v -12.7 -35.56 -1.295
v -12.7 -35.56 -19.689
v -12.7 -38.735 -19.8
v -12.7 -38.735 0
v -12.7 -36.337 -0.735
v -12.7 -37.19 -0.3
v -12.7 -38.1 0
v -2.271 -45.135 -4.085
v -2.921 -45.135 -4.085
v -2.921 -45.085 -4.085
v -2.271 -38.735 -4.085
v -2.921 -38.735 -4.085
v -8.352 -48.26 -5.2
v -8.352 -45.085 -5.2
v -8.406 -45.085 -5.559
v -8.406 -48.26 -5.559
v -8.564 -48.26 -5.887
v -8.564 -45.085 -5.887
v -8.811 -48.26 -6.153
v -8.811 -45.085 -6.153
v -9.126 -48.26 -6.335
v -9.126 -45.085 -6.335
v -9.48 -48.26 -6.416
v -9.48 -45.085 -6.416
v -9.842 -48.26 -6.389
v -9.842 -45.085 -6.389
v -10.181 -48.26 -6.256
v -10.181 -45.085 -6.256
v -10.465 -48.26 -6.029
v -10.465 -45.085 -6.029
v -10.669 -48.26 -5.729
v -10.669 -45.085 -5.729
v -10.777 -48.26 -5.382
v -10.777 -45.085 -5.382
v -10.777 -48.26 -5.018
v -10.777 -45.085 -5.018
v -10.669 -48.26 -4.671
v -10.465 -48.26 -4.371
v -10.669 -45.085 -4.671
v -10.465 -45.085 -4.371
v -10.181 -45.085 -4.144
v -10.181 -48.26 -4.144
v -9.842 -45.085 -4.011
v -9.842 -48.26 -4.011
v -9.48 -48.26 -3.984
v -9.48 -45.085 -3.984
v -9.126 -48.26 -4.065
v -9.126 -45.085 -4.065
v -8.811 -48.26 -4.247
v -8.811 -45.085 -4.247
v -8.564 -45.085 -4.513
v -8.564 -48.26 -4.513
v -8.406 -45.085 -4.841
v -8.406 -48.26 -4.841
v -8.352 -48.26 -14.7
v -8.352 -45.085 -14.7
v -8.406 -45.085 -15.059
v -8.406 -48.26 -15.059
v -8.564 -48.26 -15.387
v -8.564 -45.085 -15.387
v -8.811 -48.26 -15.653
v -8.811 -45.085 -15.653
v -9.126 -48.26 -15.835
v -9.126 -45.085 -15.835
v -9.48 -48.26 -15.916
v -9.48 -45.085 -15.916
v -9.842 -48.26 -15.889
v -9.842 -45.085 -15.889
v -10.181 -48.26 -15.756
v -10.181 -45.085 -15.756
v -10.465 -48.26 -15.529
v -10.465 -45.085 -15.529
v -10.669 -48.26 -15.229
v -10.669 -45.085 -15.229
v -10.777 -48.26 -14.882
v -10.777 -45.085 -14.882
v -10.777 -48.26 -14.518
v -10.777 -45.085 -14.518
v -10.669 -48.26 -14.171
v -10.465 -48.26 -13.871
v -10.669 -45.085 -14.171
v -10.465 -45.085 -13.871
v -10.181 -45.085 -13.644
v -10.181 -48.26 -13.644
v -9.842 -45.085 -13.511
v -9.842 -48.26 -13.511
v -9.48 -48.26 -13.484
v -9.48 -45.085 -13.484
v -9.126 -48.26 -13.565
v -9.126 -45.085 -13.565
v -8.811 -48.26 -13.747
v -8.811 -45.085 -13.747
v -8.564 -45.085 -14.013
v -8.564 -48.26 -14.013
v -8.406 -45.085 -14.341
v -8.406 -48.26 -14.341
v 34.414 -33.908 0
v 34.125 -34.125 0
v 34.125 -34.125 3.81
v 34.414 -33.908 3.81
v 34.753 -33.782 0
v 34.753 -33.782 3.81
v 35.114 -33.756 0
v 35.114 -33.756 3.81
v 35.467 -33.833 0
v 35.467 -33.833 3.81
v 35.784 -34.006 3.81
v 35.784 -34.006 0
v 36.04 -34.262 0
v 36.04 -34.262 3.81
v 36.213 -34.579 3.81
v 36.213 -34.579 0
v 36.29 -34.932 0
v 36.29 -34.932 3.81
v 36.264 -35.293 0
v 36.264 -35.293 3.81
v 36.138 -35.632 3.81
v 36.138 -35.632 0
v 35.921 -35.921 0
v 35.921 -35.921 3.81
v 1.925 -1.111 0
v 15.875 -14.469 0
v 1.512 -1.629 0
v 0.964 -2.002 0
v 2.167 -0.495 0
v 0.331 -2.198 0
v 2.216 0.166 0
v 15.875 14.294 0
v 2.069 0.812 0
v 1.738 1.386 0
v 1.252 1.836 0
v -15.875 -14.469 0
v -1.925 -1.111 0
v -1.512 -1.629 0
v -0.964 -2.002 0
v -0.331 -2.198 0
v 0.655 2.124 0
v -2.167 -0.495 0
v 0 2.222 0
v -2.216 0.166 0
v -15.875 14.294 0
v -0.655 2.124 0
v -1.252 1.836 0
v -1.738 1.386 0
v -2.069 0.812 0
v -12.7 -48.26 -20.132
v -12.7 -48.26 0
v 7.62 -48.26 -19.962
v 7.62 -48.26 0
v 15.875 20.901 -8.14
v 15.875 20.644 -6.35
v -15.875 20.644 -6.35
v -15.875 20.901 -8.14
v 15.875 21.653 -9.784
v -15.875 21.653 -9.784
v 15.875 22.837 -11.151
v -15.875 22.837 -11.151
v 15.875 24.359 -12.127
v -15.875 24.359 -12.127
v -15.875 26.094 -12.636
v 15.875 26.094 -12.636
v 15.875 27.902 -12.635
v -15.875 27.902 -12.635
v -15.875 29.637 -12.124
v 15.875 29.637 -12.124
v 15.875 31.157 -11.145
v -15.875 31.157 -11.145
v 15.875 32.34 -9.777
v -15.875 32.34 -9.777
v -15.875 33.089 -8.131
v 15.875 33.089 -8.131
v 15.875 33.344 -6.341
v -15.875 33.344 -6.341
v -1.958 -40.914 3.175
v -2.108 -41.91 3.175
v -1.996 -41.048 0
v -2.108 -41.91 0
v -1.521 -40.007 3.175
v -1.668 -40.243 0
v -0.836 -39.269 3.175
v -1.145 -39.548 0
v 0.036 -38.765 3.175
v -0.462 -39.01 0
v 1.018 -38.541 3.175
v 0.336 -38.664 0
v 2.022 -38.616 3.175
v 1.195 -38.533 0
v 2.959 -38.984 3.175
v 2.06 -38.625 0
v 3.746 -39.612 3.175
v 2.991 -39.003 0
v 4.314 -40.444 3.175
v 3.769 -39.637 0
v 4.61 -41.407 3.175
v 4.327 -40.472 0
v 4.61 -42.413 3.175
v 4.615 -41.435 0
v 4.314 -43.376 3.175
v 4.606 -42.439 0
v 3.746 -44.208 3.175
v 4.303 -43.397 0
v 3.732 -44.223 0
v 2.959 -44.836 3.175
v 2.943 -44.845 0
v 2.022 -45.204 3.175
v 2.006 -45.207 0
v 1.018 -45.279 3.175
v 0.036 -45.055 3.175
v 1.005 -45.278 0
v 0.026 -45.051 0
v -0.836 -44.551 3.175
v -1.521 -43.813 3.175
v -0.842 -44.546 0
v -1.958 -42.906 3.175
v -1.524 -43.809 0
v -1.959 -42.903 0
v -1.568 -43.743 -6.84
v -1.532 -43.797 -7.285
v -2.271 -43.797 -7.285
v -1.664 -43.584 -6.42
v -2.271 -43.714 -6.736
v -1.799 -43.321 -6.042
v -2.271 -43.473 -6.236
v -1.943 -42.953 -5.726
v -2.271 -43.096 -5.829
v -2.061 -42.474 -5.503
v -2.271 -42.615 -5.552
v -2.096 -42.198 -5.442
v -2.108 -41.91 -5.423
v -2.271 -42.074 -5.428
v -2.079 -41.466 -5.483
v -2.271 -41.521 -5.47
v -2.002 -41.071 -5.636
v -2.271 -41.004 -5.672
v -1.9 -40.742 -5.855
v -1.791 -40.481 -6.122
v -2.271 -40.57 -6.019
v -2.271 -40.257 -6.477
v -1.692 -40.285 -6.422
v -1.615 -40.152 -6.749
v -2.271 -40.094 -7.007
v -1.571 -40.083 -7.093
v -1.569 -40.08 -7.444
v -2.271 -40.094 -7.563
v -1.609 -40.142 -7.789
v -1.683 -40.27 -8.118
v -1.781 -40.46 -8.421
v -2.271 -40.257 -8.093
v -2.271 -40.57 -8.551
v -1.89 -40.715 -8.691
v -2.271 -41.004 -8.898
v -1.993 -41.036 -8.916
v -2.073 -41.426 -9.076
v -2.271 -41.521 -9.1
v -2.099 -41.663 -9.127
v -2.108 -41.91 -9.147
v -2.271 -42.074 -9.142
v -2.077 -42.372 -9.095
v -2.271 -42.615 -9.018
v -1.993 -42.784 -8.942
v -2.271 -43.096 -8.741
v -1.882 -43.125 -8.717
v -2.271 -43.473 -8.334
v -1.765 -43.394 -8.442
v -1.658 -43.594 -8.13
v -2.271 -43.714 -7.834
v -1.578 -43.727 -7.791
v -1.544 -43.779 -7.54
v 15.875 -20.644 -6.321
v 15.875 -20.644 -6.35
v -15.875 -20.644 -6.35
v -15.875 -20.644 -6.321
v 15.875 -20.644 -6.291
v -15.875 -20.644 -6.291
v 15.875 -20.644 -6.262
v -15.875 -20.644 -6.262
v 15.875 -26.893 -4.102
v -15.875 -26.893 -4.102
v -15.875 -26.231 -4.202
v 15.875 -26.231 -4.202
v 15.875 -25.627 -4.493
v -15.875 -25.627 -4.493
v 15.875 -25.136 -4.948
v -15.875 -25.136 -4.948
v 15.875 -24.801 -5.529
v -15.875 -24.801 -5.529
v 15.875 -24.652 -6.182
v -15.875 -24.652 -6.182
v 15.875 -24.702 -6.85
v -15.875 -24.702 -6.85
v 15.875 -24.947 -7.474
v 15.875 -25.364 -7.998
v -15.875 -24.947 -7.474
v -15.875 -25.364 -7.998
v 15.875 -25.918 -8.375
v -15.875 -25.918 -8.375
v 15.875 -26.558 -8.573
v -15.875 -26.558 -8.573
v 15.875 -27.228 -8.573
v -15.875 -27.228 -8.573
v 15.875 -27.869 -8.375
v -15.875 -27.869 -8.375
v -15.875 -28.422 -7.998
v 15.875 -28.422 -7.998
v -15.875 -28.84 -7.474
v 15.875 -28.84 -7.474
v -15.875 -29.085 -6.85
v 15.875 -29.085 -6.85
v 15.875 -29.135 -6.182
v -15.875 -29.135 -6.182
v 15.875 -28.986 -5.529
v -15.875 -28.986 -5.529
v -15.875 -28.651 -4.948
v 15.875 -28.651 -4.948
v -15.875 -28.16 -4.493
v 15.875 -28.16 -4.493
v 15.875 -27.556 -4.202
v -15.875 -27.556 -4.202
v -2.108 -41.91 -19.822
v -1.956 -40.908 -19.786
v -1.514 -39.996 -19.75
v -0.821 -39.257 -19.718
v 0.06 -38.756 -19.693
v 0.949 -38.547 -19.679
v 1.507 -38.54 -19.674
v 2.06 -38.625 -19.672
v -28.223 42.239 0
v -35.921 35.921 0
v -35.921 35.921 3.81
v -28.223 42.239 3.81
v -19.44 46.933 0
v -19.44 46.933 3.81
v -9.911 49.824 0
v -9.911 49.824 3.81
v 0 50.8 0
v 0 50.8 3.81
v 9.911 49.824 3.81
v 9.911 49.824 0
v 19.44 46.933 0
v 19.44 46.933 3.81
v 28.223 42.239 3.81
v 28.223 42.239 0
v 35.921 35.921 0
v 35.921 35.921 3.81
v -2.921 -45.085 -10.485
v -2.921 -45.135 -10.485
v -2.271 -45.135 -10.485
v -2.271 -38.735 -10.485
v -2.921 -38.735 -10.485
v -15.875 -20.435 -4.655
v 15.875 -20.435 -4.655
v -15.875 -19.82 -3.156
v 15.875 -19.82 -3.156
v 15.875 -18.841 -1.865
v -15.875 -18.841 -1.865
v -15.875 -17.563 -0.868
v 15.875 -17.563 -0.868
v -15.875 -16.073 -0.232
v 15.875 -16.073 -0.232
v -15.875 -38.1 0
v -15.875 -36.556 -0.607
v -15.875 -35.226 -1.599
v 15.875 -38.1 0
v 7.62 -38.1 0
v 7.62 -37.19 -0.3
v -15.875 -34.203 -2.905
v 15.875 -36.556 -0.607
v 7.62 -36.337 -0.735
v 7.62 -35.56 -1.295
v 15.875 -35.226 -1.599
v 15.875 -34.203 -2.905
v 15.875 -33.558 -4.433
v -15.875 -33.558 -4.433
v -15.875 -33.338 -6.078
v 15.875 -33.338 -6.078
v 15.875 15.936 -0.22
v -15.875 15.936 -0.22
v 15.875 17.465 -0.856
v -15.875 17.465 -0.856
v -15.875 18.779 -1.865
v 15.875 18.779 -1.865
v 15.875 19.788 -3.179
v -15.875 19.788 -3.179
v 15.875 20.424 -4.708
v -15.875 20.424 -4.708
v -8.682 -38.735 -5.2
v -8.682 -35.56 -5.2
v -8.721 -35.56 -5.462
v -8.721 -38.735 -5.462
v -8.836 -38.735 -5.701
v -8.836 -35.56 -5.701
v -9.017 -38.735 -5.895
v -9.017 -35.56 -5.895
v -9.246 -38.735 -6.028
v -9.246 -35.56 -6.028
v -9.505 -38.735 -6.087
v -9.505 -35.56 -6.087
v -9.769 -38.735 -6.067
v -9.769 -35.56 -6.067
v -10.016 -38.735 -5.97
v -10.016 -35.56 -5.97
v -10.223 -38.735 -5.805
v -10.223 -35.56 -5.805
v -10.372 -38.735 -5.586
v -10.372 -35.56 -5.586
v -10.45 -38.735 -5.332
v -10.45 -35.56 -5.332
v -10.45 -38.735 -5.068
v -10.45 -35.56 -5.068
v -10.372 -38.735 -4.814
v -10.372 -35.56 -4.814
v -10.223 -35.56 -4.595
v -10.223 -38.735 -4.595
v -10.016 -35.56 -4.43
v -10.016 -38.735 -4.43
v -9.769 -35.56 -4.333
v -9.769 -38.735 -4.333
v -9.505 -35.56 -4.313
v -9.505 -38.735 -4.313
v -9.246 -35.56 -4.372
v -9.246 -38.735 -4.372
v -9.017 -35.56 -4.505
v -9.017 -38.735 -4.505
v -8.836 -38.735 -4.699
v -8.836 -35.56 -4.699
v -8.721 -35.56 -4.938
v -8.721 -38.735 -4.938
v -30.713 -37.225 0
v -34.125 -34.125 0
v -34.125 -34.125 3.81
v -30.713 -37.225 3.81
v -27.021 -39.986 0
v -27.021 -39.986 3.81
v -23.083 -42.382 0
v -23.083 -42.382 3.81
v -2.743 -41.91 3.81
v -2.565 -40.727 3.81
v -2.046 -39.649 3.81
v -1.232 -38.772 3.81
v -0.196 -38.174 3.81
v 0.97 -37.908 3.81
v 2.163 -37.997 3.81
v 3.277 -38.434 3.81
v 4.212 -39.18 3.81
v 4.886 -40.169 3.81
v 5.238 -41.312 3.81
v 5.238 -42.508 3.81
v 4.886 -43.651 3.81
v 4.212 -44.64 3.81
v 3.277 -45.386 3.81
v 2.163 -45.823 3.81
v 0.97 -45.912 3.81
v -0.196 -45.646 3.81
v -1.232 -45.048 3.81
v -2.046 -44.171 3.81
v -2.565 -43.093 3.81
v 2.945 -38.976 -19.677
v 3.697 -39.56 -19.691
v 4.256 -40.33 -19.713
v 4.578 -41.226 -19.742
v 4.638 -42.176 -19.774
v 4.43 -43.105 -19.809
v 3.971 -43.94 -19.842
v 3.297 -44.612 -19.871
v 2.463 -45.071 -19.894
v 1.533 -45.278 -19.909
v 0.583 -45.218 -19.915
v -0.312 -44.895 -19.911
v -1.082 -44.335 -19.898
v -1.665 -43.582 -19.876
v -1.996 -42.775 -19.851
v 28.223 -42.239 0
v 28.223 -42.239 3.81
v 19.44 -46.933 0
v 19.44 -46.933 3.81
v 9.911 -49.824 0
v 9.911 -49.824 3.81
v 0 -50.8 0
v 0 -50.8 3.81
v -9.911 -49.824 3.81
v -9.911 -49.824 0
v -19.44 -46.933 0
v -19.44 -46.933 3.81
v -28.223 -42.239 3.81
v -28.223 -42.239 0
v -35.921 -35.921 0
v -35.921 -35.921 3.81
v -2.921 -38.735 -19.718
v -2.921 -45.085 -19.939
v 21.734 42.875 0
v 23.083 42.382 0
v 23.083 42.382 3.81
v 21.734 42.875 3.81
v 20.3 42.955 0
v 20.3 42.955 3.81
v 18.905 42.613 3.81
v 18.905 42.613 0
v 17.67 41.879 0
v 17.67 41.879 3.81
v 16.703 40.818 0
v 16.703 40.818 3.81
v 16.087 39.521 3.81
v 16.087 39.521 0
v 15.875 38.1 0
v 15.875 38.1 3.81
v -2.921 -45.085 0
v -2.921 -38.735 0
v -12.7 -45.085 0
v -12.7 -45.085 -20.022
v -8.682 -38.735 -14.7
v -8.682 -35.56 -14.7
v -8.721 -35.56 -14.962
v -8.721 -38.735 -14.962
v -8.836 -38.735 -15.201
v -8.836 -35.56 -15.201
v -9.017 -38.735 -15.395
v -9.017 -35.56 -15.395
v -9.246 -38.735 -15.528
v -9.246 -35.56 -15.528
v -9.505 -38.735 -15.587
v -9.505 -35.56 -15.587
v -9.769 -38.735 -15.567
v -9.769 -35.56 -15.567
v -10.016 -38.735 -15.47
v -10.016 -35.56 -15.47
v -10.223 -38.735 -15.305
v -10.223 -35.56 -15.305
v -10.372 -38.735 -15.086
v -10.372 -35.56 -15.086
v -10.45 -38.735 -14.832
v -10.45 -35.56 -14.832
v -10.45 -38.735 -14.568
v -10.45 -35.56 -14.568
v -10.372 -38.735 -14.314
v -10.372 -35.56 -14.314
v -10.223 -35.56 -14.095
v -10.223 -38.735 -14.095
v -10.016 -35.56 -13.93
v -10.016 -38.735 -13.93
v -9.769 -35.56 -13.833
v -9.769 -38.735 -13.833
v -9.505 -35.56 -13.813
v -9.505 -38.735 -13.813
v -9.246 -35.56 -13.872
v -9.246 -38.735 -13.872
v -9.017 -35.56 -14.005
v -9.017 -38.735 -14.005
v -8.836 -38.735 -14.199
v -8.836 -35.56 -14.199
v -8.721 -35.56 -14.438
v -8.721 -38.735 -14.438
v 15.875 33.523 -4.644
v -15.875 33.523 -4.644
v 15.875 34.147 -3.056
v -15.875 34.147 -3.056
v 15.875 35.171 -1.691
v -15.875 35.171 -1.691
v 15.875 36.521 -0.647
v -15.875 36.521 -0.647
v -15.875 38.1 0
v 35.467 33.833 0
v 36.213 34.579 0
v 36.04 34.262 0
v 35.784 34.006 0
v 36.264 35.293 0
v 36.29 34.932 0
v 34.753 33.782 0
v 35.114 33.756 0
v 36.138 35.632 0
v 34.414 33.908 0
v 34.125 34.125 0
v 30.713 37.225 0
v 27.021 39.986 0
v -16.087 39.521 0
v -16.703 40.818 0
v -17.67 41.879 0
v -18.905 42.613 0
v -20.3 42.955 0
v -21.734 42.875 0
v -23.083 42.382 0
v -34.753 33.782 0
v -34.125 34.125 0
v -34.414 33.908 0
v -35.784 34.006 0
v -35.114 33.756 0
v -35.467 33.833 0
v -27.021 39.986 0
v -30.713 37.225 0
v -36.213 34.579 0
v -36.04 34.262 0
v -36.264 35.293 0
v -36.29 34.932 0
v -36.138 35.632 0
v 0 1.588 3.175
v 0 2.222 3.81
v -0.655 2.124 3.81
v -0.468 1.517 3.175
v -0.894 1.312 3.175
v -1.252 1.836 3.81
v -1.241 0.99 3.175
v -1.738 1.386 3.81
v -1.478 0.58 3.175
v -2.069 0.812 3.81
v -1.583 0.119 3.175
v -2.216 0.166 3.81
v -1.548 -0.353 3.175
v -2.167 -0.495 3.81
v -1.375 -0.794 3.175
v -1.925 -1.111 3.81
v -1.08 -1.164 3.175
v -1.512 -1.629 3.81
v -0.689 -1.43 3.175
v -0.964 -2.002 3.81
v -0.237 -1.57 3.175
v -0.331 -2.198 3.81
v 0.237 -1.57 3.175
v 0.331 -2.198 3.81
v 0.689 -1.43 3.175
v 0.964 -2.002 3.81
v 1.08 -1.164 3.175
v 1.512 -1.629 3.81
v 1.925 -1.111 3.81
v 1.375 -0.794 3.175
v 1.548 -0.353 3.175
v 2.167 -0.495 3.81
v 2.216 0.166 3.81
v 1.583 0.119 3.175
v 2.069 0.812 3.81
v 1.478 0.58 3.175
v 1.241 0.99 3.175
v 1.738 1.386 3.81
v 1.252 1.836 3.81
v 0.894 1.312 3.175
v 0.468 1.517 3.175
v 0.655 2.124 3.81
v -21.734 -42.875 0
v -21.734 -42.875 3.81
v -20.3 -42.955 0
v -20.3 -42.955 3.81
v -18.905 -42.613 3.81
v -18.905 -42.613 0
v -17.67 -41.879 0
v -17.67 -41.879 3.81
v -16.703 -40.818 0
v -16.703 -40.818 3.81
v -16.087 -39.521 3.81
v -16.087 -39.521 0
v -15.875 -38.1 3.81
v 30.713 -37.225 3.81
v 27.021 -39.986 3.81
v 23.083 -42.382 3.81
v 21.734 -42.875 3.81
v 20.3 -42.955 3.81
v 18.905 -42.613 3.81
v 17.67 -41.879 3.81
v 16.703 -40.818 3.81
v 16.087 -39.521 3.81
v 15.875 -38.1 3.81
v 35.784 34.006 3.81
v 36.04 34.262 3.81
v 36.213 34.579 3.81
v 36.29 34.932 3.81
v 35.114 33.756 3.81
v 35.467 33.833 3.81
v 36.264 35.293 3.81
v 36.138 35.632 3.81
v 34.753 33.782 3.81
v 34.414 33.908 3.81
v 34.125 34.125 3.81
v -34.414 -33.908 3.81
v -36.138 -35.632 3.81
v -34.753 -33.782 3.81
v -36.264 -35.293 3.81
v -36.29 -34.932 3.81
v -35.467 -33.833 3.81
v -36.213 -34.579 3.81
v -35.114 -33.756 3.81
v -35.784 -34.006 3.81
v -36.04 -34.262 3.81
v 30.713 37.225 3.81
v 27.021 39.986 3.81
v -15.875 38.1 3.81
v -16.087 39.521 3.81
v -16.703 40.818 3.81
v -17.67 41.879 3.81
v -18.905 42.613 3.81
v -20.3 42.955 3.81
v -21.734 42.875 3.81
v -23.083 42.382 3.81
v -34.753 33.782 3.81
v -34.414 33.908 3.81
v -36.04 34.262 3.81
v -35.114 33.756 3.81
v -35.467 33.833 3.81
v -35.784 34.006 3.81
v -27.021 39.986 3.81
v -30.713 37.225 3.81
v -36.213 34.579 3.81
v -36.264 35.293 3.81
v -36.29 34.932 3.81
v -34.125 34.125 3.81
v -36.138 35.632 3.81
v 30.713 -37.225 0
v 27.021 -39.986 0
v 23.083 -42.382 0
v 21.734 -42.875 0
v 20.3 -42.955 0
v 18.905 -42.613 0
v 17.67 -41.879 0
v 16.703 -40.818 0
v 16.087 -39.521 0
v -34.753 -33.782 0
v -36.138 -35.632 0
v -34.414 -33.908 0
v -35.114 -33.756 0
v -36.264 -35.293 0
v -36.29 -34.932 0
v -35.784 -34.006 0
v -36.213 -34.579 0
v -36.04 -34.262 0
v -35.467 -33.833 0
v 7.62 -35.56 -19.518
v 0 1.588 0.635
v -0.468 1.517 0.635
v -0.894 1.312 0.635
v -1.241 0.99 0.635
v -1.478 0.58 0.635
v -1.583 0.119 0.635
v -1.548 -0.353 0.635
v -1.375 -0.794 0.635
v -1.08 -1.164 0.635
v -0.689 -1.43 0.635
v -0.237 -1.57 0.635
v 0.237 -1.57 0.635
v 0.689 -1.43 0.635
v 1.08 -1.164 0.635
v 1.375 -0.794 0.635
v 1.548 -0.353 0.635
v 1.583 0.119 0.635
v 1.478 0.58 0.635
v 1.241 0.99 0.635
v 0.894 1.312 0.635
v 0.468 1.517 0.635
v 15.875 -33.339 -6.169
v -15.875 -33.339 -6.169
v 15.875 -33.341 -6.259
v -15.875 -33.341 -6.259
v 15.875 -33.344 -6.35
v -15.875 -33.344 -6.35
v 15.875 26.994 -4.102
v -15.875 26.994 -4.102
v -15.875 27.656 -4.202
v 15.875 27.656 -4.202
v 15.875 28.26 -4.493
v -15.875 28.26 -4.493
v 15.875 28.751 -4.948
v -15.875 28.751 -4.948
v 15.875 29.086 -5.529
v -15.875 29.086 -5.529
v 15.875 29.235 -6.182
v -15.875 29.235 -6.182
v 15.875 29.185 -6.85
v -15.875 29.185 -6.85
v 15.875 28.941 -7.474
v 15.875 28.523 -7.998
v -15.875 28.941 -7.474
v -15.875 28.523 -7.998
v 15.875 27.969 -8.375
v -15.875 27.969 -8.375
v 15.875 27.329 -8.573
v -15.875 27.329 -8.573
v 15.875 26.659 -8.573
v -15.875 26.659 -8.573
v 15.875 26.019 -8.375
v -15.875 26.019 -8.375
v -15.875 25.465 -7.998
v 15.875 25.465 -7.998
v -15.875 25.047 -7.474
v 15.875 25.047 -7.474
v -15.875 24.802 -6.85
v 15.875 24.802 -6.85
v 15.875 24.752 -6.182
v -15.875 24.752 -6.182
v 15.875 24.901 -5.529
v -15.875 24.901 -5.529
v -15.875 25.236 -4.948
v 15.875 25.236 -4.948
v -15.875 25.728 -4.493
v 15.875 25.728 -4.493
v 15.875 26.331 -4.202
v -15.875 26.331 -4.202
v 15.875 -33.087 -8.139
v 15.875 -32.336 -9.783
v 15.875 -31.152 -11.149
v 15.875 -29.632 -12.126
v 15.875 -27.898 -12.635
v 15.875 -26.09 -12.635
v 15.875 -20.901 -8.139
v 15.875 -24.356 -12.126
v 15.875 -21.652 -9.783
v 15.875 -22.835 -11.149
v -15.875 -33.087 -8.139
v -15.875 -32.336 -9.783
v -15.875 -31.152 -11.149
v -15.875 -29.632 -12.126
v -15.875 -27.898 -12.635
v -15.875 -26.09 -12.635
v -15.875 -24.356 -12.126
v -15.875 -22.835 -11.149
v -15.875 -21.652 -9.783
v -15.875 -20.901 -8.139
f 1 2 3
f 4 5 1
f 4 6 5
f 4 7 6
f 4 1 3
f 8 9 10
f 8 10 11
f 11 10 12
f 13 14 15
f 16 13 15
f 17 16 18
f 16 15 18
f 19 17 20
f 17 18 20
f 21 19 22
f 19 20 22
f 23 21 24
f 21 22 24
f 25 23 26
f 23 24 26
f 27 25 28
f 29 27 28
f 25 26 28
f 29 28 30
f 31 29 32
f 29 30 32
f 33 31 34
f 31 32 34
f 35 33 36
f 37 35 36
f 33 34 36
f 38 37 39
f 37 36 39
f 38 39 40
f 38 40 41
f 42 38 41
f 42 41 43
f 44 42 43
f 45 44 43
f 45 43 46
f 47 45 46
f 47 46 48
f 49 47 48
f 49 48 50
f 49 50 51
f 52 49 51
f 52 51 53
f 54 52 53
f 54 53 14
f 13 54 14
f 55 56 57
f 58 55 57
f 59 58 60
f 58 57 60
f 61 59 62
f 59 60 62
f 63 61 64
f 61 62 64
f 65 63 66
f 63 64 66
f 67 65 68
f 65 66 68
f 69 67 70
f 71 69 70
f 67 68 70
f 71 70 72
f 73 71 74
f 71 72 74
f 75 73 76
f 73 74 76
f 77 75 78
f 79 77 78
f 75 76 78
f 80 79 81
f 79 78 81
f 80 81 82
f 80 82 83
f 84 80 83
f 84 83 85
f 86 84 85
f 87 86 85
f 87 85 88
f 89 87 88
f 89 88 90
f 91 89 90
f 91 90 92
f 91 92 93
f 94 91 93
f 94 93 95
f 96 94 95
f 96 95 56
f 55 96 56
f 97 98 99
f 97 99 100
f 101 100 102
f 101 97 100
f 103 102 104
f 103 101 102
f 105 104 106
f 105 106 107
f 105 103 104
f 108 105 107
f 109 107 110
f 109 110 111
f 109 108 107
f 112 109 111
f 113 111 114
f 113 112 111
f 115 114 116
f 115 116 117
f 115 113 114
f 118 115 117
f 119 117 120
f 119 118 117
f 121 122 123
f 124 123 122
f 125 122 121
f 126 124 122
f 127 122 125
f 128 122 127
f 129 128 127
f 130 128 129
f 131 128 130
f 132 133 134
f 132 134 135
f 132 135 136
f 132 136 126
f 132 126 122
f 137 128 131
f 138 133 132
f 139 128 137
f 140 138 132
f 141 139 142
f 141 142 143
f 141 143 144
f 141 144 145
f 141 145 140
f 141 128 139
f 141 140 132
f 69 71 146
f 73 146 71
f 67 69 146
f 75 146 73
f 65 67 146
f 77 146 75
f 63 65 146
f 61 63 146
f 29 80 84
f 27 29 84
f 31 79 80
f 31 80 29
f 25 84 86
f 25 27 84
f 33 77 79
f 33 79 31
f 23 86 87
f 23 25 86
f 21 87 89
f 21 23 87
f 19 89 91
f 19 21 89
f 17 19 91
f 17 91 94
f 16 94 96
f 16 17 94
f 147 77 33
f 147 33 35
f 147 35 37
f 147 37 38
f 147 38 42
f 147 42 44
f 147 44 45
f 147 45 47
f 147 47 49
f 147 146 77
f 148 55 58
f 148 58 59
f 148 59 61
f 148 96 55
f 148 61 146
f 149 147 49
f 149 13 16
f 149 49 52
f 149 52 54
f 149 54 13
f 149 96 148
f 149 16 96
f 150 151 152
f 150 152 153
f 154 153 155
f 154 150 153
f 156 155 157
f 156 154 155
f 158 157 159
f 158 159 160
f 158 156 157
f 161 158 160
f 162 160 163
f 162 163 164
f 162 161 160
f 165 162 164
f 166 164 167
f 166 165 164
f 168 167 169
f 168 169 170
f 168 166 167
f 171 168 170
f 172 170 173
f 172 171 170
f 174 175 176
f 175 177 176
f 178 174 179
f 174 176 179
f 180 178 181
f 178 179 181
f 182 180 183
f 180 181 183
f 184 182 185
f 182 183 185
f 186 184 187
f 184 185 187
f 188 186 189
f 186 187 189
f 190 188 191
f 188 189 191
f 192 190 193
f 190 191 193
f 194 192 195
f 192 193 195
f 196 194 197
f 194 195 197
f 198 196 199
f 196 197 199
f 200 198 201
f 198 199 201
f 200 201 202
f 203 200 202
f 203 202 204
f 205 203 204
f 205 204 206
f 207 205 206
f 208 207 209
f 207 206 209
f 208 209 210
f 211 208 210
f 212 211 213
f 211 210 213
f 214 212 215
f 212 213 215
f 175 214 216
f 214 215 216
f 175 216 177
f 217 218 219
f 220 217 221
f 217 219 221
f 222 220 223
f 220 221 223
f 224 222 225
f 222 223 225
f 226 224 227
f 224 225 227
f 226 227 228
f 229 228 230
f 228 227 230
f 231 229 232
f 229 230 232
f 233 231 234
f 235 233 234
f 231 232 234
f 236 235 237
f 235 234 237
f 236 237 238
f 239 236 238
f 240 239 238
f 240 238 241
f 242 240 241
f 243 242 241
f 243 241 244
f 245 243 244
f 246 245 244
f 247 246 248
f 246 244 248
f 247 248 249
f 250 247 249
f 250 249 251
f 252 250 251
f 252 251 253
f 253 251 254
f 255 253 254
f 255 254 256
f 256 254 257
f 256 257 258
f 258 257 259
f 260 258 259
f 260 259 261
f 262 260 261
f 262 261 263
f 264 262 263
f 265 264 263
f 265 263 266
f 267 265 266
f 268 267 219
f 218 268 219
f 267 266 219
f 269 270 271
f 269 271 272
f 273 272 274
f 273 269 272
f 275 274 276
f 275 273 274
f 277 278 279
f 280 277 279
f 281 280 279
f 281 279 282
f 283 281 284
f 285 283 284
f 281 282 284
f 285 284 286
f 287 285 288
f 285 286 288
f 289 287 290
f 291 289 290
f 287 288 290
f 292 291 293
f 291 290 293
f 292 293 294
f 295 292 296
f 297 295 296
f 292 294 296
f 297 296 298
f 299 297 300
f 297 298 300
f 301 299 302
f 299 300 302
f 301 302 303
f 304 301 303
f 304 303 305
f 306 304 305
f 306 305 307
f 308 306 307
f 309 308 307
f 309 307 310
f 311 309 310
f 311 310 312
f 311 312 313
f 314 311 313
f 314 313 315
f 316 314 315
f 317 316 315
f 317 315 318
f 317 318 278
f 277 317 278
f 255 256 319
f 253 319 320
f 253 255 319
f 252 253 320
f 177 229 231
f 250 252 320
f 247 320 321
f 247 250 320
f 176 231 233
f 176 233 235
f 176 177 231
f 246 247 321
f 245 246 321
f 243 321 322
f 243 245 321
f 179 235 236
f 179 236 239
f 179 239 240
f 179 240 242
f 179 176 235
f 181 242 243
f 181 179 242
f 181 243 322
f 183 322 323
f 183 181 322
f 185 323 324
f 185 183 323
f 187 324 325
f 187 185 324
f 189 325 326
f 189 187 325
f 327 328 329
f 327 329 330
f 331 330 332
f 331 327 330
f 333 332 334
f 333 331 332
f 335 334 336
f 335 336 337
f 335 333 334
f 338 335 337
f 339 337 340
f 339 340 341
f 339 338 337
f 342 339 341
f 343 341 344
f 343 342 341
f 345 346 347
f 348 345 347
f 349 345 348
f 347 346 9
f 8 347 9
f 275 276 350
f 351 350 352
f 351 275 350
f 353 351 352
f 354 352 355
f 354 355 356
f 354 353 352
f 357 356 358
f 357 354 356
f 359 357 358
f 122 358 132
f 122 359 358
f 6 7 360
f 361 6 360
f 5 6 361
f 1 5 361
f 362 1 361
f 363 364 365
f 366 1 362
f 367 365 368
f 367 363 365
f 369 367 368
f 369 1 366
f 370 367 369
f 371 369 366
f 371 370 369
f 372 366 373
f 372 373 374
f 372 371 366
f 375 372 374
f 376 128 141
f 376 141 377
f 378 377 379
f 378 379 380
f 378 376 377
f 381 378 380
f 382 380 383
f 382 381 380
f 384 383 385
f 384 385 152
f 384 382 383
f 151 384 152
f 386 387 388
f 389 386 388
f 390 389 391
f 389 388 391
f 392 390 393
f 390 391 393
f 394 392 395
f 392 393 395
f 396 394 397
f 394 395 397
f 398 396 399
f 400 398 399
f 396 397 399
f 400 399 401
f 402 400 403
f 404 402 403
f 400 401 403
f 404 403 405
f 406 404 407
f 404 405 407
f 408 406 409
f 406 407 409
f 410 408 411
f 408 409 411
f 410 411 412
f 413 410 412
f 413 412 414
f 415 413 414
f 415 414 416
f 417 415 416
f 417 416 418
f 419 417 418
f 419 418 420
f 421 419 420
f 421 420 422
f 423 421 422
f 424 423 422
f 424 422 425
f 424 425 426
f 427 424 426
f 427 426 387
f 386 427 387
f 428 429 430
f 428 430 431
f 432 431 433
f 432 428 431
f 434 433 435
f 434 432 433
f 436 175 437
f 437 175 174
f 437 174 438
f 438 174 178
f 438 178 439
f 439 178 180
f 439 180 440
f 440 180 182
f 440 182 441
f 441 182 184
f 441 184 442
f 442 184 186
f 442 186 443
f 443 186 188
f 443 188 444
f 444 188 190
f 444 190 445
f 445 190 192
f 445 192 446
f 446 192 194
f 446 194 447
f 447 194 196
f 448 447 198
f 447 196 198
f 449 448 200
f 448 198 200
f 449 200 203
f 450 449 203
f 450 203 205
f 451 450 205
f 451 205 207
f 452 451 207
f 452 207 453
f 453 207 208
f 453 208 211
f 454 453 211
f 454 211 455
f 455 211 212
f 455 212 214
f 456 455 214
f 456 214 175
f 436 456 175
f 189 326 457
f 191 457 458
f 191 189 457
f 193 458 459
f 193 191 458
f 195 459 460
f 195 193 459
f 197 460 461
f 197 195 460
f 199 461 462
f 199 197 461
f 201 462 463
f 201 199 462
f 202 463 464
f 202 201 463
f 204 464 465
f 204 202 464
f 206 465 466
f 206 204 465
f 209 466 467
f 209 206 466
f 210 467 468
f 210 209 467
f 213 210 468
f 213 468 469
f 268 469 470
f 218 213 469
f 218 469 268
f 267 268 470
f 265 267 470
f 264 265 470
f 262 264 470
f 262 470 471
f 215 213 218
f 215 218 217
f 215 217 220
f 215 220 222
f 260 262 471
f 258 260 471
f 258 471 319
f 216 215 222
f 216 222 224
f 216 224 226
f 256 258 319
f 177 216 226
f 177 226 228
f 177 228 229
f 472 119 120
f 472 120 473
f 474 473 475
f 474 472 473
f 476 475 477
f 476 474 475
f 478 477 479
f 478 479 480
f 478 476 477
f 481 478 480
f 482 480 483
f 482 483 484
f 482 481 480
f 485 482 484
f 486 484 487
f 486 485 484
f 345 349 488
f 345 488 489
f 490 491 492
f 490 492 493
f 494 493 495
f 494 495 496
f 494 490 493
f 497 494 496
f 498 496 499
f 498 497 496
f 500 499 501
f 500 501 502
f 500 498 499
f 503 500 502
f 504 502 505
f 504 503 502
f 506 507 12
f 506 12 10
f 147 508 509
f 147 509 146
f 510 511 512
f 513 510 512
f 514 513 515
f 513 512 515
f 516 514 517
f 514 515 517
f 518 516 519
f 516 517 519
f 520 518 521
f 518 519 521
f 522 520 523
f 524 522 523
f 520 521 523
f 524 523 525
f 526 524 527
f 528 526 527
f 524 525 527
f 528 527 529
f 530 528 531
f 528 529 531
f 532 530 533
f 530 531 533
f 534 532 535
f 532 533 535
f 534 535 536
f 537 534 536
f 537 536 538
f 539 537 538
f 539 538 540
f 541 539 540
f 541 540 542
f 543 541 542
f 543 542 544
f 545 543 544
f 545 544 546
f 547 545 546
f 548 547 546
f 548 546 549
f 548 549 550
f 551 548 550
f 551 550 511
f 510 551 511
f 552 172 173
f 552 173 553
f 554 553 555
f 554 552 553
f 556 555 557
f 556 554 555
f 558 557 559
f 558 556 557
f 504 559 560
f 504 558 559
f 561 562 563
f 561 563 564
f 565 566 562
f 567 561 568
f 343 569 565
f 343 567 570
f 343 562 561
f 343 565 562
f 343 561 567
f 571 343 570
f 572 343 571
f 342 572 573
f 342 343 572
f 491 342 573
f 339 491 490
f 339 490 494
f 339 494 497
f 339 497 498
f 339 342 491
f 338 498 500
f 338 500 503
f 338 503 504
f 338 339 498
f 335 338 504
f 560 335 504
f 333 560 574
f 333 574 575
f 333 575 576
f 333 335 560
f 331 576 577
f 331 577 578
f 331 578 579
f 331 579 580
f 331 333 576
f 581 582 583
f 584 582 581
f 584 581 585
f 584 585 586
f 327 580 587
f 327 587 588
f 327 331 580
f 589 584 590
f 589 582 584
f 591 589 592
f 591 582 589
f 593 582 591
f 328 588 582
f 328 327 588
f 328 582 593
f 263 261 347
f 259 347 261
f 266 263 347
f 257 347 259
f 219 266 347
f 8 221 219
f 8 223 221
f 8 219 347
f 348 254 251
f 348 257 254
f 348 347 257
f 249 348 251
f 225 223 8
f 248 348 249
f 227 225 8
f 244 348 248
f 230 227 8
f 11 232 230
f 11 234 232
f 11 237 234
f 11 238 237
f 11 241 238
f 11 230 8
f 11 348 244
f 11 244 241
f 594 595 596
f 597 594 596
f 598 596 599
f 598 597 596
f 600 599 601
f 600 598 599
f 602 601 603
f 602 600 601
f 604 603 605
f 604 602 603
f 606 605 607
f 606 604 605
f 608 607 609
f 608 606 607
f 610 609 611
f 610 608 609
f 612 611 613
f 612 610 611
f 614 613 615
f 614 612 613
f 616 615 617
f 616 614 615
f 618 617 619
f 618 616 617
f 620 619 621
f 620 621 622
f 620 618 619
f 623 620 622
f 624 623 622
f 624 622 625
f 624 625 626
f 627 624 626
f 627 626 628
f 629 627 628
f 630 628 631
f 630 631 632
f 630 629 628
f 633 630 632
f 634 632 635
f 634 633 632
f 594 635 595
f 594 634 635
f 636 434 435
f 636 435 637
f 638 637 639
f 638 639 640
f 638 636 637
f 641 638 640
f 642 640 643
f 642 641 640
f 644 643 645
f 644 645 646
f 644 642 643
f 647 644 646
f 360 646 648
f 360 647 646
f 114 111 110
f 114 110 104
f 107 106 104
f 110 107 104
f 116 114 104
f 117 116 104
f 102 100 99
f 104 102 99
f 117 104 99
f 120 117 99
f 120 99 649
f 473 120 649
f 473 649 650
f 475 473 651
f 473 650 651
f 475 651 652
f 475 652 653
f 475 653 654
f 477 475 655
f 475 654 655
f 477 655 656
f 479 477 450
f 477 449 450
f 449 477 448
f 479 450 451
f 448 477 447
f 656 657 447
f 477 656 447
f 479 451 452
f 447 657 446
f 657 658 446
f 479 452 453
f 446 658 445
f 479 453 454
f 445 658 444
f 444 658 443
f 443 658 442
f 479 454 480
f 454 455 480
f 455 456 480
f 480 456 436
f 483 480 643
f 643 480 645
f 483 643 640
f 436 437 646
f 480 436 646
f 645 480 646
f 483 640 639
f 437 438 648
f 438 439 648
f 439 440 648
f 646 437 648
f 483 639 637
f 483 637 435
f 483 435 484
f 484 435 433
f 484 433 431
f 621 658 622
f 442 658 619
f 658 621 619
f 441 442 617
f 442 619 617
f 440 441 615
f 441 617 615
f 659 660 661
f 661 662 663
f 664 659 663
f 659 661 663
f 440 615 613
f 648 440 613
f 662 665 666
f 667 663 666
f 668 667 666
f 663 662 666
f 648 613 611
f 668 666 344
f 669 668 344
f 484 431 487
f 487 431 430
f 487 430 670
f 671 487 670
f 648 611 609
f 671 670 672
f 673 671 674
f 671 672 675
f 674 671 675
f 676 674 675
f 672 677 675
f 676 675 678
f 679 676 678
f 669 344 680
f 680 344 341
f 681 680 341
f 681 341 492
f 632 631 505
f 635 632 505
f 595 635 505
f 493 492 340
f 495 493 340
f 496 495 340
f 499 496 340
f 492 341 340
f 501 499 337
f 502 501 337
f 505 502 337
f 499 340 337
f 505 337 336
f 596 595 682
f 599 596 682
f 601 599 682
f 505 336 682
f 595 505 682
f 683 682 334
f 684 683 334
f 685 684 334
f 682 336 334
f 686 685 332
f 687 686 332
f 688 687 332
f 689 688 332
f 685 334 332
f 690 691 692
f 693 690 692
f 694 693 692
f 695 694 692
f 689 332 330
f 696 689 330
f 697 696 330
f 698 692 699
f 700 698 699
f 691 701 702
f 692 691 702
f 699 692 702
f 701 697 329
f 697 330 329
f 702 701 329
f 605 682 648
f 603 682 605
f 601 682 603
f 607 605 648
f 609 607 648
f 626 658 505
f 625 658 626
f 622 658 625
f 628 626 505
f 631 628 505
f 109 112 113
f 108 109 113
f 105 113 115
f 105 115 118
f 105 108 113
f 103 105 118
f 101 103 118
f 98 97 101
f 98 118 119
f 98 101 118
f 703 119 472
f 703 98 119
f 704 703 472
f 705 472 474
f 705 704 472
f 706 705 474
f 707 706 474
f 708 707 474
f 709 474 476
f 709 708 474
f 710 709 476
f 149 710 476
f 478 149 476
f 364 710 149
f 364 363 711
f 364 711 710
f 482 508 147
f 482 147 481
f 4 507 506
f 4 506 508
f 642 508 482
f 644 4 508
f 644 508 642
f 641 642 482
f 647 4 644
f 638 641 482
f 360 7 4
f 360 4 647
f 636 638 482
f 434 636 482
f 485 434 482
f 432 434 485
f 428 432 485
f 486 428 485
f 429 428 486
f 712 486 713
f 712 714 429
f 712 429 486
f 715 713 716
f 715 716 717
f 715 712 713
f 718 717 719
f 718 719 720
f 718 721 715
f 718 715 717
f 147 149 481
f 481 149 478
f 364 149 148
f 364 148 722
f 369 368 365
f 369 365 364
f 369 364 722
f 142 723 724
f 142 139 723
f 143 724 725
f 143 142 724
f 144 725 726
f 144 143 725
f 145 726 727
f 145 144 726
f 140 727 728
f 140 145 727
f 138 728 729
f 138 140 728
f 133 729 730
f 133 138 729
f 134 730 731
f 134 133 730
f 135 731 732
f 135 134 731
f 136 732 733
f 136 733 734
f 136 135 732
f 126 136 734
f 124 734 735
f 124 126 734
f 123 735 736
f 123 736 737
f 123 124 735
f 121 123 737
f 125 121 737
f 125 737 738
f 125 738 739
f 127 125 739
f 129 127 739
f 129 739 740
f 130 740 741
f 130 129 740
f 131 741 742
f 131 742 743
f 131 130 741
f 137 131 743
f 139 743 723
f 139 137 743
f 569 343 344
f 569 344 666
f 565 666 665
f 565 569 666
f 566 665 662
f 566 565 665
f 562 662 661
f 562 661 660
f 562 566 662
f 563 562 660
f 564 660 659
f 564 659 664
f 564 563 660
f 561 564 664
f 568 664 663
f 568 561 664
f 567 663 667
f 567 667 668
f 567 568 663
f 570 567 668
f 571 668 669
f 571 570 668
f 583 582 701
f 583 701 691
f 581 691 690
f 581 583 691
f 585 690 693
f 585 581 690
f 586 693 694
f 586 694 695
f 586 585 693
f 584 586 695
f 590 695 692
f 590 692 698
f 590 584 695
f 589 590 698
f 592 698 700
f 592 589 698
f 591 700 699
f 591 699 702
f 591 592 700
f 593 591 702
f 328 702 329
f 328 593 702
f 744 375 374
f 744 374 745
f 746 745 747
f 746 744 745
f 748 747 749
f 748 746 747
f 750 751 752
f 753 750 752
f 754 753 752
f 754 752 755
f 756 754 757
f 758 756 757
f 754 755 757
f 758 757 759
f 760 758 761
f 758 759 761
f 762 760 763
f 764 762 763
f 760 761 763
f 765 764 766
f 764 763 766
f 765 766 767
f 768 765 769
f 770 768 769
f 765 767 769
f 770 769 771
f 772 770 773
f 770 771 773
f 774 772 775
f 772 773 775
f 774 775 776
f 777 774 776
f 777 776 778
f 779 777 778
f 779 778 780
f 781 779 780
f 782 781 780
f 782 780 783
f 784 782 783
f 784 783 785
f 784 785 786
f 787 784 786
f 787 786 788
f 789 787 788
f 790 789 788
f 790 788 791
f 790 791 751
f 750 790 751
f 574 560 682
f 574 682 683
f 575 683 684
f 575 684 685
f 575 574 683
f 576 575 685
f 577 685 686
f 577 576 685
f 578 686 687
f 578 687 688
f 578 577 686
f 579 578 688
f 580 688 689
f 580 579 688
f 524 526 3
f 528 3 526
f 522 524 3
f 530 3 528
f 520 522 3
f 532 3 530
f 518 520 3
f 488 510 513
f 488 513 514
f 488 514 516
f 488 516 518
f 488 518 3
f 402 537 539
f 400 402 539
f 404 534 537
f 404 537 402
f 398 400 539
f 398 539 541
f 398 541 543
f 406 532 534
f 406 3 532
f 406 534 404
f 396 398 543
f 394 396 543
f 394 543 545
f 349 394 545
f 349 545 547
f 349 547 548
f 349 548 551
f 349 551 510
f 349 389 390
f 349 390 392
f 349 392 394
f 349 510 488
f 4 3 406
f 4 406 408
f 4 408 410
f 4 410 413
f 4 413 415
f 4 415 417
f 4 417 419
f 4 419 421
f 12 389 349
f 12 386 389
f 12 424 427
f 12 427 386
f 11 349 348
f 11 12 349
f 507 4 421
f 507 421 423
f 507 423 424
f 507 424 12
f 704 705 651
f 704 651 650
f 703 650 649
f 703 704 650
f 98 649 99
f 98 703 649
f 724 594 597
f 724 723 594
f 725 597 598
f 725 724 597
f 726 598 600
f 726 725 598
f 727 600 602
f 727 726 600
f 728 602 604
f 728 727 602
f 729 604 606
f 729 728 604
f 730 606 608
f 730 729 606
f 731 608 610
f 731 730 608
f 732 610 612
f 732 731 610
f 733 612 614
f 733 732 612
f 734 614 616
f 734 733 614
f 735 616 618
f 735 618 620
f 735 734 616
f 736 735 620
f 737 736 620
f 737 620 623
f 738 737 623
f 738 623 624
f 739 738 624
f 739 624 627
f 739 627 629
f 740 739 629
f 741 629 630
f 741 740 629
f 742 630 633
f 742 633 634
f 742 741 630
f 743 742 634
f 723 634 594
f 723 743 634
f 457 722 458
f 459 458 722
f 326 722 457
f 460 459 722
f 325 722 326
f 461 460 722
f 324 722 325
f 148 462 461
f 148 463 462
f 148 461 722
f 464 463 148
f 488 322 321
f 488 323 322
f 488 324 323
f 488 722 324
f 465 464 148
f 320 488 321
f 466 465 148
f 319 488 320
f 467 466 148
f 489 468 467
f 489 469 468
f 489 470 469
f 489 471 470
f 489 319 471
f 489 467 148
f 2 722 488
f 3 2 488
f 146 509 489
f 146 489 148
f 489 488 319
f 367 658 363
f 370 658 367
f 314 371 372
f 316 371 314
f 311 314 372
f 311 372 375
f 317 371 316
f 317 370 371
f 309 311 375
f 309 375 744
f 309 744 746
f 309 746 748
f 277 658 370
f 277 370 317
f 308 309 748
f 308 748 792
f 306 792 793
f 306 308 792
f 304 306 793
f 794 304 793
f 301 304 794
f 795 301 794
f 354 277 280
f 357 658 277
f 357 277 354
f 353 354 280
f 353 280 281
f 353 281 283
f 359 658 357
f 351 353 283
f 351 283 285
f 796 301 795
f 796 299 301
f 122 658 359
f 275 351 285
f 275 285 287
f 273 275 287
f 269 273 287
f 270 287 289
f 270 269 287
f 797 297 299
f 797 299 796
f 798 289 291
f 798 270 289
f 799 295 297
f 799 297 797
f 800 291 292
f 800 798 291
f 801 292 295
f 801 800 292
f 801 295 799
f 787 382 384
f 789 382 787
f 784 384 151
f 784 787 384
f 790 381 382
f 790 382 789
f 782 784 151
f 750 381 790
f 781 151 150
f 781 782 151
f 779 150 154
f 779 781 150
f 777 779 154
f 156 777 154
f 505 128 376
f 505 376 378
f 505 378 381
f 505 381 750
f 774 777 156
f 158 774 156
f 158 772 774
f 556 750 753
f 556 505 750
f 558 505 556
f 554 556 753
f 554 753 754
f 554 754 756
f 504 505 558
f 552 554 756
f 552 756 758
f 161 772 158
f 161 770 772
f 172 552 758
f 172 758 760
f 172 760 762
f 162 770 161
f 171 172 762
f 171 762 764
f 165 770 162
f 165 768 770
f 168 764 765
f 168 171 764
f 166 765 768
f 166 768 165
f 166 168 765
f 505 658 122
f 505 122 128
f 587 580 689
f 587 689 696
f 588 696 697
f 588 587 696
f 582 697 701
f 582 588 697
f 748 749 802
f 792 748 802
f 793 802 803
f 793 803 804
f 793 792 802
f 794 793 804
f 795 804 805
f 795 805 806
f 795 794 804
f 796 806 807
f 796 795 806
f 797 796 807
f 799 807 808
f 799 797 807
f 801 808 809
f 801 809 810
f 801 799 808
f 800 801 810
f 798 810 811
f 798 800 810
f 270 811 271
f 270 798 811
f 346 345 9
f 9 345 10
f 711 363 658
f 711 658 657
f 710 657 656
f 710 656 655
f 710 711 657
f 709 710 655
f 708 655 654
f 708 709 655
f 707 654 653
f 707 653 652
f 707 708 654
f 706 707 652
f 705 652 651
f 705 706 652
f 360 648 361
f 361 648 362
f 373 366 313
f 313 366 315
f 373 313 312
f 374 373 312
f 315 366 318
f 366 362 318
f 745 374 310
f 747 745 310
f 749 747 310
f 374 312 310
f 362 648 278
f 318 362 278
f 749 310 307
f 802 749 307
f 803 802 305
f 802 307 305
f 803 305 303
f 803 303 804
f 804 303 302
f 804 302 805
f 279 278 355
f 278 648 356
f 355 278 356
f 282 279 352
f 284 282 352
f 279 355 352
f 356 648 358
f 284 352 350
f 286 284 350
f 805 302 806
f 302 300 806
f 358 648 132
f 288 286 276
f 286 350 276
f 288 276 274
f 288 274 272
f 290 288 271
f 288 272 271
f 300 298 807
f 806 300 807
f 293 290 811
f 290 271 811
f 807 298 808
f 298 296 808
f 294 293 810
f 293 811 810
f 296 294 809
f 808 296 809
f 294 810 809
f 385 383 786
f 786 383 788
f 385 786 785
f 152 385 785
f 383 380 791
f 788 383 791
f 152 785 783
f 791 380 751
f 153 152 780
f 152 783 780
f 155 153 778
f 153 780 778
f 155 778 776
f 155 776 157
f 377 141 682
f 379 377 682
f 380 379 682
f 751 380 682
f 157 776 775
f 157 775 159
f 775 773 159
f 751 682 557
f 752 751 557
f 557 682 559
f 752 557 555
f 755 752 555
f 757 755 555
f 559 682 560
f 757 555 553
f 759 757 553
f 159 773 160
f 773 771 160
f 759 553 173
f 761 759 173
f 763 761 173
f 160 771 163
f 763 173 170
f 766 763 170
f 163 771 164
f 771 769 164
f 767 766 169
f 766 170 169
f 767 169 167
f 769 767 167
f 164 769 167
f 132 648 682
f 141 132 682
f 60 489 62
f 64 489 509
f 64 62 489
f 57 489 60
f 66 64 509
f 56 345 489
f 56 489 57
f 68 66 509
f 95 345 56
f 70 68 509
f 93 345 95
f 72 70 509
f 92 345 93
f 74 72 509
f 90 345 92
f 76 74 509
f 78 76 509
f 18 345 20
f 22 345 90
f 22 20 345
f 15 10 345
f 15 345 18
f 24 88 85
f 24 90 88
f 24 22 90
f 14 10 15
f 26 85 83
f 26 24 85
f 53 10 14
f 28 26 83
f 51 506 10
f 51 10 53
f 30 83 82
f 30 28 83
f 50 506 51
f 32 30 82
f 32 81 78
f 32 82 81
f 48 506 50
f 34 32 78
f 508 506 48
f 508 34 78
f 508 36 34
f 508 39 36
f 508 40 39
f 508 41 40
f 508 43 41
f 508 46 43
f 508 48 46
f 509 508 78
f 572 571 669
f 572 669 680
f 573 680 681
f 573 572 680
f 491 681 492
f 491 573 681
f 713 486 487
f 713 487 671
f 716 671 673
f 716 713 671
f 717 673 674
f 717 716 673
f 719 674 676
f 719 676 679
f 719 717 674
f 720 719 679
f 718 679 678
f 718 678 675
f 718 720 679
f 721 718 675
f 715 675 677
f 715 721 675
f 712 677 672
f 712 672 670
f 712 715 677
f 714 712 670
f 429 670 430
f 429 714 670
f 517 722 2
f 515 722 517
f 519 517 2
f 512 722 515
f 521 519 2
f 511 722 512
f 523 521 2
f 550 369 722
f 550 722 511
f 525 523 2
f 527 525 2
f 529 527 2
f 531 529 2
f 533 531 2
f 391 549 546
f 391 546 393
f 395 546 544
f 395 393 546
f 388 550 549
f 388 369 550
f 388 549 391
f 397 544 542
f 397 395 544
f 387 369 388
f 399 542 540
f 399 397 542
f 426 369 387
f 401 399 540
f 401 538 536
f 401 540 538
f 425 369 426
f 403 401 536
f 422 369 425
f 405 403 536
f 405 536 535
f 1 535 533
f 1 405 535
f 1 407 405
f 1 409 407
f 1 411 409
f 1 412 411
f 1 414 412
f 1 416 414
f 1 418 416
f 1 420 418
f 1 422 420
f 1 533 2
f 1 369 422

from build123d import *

# Parameters (mm, degrees)
MAIN_BODY_DEPTH                 = 3.81
BOSSES_FOR_SCREWS_DEPTH         = 31.75
F_8_CLEARANCE_HOLE_FOR_SCREWS_D = 4.4958
SWITCH_HOLDER_BODY_REACH        = 65.711
SKETCH19_R                      = 3.3782
F_1_4_QR_PIN_HOLE_D             = 6.7564
F_1_4_QR_PIN_HOLE_CSINK_D       = 8.0264
F_1_4_QR_PIN_HOLE_CSINK_ANGLE   = 90
SKETCH25_R                      = 1.862
PLUNGER_HOLE_DEPTH              = 2.54
SKETCH33_W                      = 6.4
SKETCH33_H                      = 6.4
SWITCH_BODY_CLEARANCE_DEPTH     = 0.65024
F_2_CLEARANCE_HOLE1_D           = 2.4384
F_2_CLEARANCE_HOLE1_DEPTH       = 3.175
TAP_DRILL_FOR_2_56_TAP1_D       = 1.778
TAP_DRILL_FOR_2_56_TAP1_DEPTH   = 12.7


with BuildPart() as part:
    # Sketch3 → Main Body (new body)
    with BuildSketch(Plane.XY):
        with BuildLine():
            Line((-15.875, -38.1), (-15.875, 38.1))
            ThreePointArc((-15.875, 38.1), (-18.260491841, 42.291797068), (-23.082694008, 42.38179842))
            ThreePointArc((-23.082694008, 42.38179842), (-28.900226452, 38.649767283), (-34.12497326, 34.12497326))
            ThreePointArc((-34.12497326, 34.12497326), (-35.921024484, 34.12497326), (-35.921024484, 35.921024484))
            ThreePointArc((-35.921024484, 35.921024484), (0, 50.8), (35.921024484, 35.921024484))
            ThreePointArc((35.921024484, 35.921024484), (35.921024484, 34.12497326), (34.12497326, 34.12497326))
            ThreePointArc((34.12497326, 34.12497326), (28.900226452, 38.649767283), (23.082694008, 42.38179842))
            ThreePointArc((23.082694008, 42.38179842), (18.260491841, 42.291797068), (15.875, 38.1))
            Line((15.875, 38.1), (15.875, -38.1))
            ThreePointArc((15.875, -38.1), (18.260491841, -42.291797068), (23.082694008, -42.38179842))
            ThreePointArc((23.082694008, -42.38179842), (28.900226452, -38.649767283), (34.12497326, -34.12497326))
            ThreePointArc((34.12497326, -34.12497326), (35.921024484, -34.12497326), (35.921024484, -35.921024484))
            ThreePointArc((35.921024484, -35.921024484), (0, -50.8), (-35.921024484, -35.921024484))
            ThreePointArc((-35.921024484, -35.921024484), (-35.921024484, -34.12497326), (-34.12497326, -34.12497326))
            ThreePointArc((-34.12497326, -34.12497326), (-28.900226452, -38.649767283), (-23.082694008, -42.38179842))
            ThreePointArc((-23.082694008, -42.38179842), (-18.260491841, -42.291797068), (-15.875, -38.1))
        make_face()
    extrude(amount=MAIN_BODY_DEPTH)

    # Sketch5 → Bosses for screws (add)
    with BuildSketch(Plane(origin=(15.875, 0, 0), x_dir=(0, 0, -1), z_dir=(1, 0, 0))):
        with BuildLine():
            Line((0, 38.1), (0, 26.99385))
            Line((0, 26.99385), (0, 14.29385))
            ThreePointArc((0, 14.29385), (1.86498297, 18.77886703), (6.35, 20.64385))
            ThreePointArc((6.35, 20.64385), (12.699998494, 26.998224058), (6.341251887, 33.343843974))
            ThreePointArc((6.341251887, 33.343843974), (2.338844583, 34.612930799), (0, 38.1))
        make_face()
        with BuildLine():
            ThreePointArc((6.261703048, -20.644463916), (1.864650947, -18.840779739), (0, -14.469233029))
            Line((0, -14.469233029), (0, -26.99385))
            Line((0, -26.99385), (0, -38.1))
            ThreePointArc((0, -38.1), (2.217611083, -34.670801888), (6.077775616, -33.338012189))
            ThreePointArc((6.077775616, -33.338012189), (6.213919542, -33.33945129), (6.35, -33.34385))
            ThreePointArc((6.35, -33.34385), (12.7, -26.99385), (6.35, -20.64385))
            ThreePointArc((6.35, -20.64385), (6.305852606, -20.644312569), (6.261703048, -20.644463916))
        make_face()
    extrude(amount=-BOSSES_FOR_SCREWS_DEPTH)

    # #8 Clearance Hole for screws (through all)
    with Locations(Plane(origin=(15.875, 0, 0), x_dir=(0, 0, -1), z_dir=(1, 0, 0))):
        with Locations((6.35, 26.99385), (6.35, -26.893399733)):
            Hole(F_8_CLEARANCE_HOLE_FOR_SCREWS_D / 2)

    # Sketch10 → 1/8 (0.125) Diameter let down hole (revolve, cut)
    with BuildSketch(Plane.YZ):
        Polygon((0, 0), (0, 3.81), (2.2225, 3.81), (1.5875, 3.175), (1.5875, 0.635), (2.2225, 0), align=None)
    revolve(axis=Axis((0, 0, -6.35), (0, 0, 1)), mode=Mode.SUBTRACT)

    # Switch holder body: up to this plane
    switch_holder_body_end = Plane(origin=(-3.297630422, -38.686979812, -19.719207275), z_dir=(0.008390733100517729, 0.03489949670250099, -0.9993556027400597))
    # Sketch19 → Switch holder body (add, up to the surface)
    with BuildSketch(Plane(origin=(0, 0, 0), x_dir=(-1, 0, 0), z_dir=(0, 0, -1)), mode=Mode.PRIVATE) as switch_holder_body_sk1:
        Polygon((12.7, -38.735), (2.921, -38.735), (2.921, -45.085), (12.7, -45.085), (12.7, -48.26), (-7.62, -48.26), (-7.62, -35.56), (12.7, -35.56), align=None)
        with Locations(Location((-1.27, -41.91, 0), (0, 0, 103.518789087))):
            Circle(SKETCH19_R, mode=Mode.SUBTRACT)
    switch_holder_body_tool1 = split(extrude(switch_holder_body_sk1.sketch, amount=SWITCH_HOLDER_BODY_REACH, mode=Mode.PRIVATE), bisect_by=switch_holder_body_end, keep=Keep.BOTH, mode=Mode.PRIVATE)
    add(switch_holder_body_tool1.solids().sort_by_distance((-7.8105, -38.495377, 0))[0])

    # 1/4 QR pin hole (through all)
    with Locations(Plane.XY.offset(3.81)):
        with Locations((1.27, -41.91)):
            CounterSinkHole(F_1_4_QR_PIN_HOLE_D / 2, F_1_4_QR_PIN_HOLE_CSINK_D / 2, counter_sink_angle=F_1_4_QR_PIN_HOLE_CSINK_ANGLE)

    # Sketch25 → plunger hole (cut)
    with BuildSketch(Plane.ZY.offset(2.921)):
        with Locations(Location((-7.285, -41.935, 0), (0, 0, 270))):
            Circle(SKETCH25_R)
    extrude(amount=-PLUNGER_HOLE_DEPTH, mode=Mode.SUBTRACT)

    # Sketch33 → switch body clearance (cut)
    with BuildSketch(Plane.ZY.offset(2.921)):
        with Locations((-7.285, -41.935)):
            Rectangle(SKETCH33_W, SKETCH33_H)
    extrude(amount=-SWITCH_BODY_CLEARANCE_DEPTH, mode=Mode.SUBTRACT)

    # #2 Clearance Hole1
    with Locations(Plane(origin=(0, -48.26, 0), x_dir=(-1, 0, 0), z_dir=(0, -1, 0))):
        with Locations((9.571, 14.7), (9.571, 5.2)):
            Hole(F_2_CLEARANCE_HOLE1_D / 2, depth=F_2_CLEARANCE_HOLE1_DEPTH)

    # Tap Drill for #2-56 Tap1
    with Locations(Plane(origin=(0, -48.26, 0), x_dir=(-1, 0, 0), z_dir=(0, -1, 0))):
        with Locations((9.571, 14.7), (9.571, 5.2)):
            Hole(TAP_DRILL_FOR_2_56_TAP1_D / 2, depth=TAP_DRILL_FOR_2_56_TAP1_DEPTH)


solid = part.part
